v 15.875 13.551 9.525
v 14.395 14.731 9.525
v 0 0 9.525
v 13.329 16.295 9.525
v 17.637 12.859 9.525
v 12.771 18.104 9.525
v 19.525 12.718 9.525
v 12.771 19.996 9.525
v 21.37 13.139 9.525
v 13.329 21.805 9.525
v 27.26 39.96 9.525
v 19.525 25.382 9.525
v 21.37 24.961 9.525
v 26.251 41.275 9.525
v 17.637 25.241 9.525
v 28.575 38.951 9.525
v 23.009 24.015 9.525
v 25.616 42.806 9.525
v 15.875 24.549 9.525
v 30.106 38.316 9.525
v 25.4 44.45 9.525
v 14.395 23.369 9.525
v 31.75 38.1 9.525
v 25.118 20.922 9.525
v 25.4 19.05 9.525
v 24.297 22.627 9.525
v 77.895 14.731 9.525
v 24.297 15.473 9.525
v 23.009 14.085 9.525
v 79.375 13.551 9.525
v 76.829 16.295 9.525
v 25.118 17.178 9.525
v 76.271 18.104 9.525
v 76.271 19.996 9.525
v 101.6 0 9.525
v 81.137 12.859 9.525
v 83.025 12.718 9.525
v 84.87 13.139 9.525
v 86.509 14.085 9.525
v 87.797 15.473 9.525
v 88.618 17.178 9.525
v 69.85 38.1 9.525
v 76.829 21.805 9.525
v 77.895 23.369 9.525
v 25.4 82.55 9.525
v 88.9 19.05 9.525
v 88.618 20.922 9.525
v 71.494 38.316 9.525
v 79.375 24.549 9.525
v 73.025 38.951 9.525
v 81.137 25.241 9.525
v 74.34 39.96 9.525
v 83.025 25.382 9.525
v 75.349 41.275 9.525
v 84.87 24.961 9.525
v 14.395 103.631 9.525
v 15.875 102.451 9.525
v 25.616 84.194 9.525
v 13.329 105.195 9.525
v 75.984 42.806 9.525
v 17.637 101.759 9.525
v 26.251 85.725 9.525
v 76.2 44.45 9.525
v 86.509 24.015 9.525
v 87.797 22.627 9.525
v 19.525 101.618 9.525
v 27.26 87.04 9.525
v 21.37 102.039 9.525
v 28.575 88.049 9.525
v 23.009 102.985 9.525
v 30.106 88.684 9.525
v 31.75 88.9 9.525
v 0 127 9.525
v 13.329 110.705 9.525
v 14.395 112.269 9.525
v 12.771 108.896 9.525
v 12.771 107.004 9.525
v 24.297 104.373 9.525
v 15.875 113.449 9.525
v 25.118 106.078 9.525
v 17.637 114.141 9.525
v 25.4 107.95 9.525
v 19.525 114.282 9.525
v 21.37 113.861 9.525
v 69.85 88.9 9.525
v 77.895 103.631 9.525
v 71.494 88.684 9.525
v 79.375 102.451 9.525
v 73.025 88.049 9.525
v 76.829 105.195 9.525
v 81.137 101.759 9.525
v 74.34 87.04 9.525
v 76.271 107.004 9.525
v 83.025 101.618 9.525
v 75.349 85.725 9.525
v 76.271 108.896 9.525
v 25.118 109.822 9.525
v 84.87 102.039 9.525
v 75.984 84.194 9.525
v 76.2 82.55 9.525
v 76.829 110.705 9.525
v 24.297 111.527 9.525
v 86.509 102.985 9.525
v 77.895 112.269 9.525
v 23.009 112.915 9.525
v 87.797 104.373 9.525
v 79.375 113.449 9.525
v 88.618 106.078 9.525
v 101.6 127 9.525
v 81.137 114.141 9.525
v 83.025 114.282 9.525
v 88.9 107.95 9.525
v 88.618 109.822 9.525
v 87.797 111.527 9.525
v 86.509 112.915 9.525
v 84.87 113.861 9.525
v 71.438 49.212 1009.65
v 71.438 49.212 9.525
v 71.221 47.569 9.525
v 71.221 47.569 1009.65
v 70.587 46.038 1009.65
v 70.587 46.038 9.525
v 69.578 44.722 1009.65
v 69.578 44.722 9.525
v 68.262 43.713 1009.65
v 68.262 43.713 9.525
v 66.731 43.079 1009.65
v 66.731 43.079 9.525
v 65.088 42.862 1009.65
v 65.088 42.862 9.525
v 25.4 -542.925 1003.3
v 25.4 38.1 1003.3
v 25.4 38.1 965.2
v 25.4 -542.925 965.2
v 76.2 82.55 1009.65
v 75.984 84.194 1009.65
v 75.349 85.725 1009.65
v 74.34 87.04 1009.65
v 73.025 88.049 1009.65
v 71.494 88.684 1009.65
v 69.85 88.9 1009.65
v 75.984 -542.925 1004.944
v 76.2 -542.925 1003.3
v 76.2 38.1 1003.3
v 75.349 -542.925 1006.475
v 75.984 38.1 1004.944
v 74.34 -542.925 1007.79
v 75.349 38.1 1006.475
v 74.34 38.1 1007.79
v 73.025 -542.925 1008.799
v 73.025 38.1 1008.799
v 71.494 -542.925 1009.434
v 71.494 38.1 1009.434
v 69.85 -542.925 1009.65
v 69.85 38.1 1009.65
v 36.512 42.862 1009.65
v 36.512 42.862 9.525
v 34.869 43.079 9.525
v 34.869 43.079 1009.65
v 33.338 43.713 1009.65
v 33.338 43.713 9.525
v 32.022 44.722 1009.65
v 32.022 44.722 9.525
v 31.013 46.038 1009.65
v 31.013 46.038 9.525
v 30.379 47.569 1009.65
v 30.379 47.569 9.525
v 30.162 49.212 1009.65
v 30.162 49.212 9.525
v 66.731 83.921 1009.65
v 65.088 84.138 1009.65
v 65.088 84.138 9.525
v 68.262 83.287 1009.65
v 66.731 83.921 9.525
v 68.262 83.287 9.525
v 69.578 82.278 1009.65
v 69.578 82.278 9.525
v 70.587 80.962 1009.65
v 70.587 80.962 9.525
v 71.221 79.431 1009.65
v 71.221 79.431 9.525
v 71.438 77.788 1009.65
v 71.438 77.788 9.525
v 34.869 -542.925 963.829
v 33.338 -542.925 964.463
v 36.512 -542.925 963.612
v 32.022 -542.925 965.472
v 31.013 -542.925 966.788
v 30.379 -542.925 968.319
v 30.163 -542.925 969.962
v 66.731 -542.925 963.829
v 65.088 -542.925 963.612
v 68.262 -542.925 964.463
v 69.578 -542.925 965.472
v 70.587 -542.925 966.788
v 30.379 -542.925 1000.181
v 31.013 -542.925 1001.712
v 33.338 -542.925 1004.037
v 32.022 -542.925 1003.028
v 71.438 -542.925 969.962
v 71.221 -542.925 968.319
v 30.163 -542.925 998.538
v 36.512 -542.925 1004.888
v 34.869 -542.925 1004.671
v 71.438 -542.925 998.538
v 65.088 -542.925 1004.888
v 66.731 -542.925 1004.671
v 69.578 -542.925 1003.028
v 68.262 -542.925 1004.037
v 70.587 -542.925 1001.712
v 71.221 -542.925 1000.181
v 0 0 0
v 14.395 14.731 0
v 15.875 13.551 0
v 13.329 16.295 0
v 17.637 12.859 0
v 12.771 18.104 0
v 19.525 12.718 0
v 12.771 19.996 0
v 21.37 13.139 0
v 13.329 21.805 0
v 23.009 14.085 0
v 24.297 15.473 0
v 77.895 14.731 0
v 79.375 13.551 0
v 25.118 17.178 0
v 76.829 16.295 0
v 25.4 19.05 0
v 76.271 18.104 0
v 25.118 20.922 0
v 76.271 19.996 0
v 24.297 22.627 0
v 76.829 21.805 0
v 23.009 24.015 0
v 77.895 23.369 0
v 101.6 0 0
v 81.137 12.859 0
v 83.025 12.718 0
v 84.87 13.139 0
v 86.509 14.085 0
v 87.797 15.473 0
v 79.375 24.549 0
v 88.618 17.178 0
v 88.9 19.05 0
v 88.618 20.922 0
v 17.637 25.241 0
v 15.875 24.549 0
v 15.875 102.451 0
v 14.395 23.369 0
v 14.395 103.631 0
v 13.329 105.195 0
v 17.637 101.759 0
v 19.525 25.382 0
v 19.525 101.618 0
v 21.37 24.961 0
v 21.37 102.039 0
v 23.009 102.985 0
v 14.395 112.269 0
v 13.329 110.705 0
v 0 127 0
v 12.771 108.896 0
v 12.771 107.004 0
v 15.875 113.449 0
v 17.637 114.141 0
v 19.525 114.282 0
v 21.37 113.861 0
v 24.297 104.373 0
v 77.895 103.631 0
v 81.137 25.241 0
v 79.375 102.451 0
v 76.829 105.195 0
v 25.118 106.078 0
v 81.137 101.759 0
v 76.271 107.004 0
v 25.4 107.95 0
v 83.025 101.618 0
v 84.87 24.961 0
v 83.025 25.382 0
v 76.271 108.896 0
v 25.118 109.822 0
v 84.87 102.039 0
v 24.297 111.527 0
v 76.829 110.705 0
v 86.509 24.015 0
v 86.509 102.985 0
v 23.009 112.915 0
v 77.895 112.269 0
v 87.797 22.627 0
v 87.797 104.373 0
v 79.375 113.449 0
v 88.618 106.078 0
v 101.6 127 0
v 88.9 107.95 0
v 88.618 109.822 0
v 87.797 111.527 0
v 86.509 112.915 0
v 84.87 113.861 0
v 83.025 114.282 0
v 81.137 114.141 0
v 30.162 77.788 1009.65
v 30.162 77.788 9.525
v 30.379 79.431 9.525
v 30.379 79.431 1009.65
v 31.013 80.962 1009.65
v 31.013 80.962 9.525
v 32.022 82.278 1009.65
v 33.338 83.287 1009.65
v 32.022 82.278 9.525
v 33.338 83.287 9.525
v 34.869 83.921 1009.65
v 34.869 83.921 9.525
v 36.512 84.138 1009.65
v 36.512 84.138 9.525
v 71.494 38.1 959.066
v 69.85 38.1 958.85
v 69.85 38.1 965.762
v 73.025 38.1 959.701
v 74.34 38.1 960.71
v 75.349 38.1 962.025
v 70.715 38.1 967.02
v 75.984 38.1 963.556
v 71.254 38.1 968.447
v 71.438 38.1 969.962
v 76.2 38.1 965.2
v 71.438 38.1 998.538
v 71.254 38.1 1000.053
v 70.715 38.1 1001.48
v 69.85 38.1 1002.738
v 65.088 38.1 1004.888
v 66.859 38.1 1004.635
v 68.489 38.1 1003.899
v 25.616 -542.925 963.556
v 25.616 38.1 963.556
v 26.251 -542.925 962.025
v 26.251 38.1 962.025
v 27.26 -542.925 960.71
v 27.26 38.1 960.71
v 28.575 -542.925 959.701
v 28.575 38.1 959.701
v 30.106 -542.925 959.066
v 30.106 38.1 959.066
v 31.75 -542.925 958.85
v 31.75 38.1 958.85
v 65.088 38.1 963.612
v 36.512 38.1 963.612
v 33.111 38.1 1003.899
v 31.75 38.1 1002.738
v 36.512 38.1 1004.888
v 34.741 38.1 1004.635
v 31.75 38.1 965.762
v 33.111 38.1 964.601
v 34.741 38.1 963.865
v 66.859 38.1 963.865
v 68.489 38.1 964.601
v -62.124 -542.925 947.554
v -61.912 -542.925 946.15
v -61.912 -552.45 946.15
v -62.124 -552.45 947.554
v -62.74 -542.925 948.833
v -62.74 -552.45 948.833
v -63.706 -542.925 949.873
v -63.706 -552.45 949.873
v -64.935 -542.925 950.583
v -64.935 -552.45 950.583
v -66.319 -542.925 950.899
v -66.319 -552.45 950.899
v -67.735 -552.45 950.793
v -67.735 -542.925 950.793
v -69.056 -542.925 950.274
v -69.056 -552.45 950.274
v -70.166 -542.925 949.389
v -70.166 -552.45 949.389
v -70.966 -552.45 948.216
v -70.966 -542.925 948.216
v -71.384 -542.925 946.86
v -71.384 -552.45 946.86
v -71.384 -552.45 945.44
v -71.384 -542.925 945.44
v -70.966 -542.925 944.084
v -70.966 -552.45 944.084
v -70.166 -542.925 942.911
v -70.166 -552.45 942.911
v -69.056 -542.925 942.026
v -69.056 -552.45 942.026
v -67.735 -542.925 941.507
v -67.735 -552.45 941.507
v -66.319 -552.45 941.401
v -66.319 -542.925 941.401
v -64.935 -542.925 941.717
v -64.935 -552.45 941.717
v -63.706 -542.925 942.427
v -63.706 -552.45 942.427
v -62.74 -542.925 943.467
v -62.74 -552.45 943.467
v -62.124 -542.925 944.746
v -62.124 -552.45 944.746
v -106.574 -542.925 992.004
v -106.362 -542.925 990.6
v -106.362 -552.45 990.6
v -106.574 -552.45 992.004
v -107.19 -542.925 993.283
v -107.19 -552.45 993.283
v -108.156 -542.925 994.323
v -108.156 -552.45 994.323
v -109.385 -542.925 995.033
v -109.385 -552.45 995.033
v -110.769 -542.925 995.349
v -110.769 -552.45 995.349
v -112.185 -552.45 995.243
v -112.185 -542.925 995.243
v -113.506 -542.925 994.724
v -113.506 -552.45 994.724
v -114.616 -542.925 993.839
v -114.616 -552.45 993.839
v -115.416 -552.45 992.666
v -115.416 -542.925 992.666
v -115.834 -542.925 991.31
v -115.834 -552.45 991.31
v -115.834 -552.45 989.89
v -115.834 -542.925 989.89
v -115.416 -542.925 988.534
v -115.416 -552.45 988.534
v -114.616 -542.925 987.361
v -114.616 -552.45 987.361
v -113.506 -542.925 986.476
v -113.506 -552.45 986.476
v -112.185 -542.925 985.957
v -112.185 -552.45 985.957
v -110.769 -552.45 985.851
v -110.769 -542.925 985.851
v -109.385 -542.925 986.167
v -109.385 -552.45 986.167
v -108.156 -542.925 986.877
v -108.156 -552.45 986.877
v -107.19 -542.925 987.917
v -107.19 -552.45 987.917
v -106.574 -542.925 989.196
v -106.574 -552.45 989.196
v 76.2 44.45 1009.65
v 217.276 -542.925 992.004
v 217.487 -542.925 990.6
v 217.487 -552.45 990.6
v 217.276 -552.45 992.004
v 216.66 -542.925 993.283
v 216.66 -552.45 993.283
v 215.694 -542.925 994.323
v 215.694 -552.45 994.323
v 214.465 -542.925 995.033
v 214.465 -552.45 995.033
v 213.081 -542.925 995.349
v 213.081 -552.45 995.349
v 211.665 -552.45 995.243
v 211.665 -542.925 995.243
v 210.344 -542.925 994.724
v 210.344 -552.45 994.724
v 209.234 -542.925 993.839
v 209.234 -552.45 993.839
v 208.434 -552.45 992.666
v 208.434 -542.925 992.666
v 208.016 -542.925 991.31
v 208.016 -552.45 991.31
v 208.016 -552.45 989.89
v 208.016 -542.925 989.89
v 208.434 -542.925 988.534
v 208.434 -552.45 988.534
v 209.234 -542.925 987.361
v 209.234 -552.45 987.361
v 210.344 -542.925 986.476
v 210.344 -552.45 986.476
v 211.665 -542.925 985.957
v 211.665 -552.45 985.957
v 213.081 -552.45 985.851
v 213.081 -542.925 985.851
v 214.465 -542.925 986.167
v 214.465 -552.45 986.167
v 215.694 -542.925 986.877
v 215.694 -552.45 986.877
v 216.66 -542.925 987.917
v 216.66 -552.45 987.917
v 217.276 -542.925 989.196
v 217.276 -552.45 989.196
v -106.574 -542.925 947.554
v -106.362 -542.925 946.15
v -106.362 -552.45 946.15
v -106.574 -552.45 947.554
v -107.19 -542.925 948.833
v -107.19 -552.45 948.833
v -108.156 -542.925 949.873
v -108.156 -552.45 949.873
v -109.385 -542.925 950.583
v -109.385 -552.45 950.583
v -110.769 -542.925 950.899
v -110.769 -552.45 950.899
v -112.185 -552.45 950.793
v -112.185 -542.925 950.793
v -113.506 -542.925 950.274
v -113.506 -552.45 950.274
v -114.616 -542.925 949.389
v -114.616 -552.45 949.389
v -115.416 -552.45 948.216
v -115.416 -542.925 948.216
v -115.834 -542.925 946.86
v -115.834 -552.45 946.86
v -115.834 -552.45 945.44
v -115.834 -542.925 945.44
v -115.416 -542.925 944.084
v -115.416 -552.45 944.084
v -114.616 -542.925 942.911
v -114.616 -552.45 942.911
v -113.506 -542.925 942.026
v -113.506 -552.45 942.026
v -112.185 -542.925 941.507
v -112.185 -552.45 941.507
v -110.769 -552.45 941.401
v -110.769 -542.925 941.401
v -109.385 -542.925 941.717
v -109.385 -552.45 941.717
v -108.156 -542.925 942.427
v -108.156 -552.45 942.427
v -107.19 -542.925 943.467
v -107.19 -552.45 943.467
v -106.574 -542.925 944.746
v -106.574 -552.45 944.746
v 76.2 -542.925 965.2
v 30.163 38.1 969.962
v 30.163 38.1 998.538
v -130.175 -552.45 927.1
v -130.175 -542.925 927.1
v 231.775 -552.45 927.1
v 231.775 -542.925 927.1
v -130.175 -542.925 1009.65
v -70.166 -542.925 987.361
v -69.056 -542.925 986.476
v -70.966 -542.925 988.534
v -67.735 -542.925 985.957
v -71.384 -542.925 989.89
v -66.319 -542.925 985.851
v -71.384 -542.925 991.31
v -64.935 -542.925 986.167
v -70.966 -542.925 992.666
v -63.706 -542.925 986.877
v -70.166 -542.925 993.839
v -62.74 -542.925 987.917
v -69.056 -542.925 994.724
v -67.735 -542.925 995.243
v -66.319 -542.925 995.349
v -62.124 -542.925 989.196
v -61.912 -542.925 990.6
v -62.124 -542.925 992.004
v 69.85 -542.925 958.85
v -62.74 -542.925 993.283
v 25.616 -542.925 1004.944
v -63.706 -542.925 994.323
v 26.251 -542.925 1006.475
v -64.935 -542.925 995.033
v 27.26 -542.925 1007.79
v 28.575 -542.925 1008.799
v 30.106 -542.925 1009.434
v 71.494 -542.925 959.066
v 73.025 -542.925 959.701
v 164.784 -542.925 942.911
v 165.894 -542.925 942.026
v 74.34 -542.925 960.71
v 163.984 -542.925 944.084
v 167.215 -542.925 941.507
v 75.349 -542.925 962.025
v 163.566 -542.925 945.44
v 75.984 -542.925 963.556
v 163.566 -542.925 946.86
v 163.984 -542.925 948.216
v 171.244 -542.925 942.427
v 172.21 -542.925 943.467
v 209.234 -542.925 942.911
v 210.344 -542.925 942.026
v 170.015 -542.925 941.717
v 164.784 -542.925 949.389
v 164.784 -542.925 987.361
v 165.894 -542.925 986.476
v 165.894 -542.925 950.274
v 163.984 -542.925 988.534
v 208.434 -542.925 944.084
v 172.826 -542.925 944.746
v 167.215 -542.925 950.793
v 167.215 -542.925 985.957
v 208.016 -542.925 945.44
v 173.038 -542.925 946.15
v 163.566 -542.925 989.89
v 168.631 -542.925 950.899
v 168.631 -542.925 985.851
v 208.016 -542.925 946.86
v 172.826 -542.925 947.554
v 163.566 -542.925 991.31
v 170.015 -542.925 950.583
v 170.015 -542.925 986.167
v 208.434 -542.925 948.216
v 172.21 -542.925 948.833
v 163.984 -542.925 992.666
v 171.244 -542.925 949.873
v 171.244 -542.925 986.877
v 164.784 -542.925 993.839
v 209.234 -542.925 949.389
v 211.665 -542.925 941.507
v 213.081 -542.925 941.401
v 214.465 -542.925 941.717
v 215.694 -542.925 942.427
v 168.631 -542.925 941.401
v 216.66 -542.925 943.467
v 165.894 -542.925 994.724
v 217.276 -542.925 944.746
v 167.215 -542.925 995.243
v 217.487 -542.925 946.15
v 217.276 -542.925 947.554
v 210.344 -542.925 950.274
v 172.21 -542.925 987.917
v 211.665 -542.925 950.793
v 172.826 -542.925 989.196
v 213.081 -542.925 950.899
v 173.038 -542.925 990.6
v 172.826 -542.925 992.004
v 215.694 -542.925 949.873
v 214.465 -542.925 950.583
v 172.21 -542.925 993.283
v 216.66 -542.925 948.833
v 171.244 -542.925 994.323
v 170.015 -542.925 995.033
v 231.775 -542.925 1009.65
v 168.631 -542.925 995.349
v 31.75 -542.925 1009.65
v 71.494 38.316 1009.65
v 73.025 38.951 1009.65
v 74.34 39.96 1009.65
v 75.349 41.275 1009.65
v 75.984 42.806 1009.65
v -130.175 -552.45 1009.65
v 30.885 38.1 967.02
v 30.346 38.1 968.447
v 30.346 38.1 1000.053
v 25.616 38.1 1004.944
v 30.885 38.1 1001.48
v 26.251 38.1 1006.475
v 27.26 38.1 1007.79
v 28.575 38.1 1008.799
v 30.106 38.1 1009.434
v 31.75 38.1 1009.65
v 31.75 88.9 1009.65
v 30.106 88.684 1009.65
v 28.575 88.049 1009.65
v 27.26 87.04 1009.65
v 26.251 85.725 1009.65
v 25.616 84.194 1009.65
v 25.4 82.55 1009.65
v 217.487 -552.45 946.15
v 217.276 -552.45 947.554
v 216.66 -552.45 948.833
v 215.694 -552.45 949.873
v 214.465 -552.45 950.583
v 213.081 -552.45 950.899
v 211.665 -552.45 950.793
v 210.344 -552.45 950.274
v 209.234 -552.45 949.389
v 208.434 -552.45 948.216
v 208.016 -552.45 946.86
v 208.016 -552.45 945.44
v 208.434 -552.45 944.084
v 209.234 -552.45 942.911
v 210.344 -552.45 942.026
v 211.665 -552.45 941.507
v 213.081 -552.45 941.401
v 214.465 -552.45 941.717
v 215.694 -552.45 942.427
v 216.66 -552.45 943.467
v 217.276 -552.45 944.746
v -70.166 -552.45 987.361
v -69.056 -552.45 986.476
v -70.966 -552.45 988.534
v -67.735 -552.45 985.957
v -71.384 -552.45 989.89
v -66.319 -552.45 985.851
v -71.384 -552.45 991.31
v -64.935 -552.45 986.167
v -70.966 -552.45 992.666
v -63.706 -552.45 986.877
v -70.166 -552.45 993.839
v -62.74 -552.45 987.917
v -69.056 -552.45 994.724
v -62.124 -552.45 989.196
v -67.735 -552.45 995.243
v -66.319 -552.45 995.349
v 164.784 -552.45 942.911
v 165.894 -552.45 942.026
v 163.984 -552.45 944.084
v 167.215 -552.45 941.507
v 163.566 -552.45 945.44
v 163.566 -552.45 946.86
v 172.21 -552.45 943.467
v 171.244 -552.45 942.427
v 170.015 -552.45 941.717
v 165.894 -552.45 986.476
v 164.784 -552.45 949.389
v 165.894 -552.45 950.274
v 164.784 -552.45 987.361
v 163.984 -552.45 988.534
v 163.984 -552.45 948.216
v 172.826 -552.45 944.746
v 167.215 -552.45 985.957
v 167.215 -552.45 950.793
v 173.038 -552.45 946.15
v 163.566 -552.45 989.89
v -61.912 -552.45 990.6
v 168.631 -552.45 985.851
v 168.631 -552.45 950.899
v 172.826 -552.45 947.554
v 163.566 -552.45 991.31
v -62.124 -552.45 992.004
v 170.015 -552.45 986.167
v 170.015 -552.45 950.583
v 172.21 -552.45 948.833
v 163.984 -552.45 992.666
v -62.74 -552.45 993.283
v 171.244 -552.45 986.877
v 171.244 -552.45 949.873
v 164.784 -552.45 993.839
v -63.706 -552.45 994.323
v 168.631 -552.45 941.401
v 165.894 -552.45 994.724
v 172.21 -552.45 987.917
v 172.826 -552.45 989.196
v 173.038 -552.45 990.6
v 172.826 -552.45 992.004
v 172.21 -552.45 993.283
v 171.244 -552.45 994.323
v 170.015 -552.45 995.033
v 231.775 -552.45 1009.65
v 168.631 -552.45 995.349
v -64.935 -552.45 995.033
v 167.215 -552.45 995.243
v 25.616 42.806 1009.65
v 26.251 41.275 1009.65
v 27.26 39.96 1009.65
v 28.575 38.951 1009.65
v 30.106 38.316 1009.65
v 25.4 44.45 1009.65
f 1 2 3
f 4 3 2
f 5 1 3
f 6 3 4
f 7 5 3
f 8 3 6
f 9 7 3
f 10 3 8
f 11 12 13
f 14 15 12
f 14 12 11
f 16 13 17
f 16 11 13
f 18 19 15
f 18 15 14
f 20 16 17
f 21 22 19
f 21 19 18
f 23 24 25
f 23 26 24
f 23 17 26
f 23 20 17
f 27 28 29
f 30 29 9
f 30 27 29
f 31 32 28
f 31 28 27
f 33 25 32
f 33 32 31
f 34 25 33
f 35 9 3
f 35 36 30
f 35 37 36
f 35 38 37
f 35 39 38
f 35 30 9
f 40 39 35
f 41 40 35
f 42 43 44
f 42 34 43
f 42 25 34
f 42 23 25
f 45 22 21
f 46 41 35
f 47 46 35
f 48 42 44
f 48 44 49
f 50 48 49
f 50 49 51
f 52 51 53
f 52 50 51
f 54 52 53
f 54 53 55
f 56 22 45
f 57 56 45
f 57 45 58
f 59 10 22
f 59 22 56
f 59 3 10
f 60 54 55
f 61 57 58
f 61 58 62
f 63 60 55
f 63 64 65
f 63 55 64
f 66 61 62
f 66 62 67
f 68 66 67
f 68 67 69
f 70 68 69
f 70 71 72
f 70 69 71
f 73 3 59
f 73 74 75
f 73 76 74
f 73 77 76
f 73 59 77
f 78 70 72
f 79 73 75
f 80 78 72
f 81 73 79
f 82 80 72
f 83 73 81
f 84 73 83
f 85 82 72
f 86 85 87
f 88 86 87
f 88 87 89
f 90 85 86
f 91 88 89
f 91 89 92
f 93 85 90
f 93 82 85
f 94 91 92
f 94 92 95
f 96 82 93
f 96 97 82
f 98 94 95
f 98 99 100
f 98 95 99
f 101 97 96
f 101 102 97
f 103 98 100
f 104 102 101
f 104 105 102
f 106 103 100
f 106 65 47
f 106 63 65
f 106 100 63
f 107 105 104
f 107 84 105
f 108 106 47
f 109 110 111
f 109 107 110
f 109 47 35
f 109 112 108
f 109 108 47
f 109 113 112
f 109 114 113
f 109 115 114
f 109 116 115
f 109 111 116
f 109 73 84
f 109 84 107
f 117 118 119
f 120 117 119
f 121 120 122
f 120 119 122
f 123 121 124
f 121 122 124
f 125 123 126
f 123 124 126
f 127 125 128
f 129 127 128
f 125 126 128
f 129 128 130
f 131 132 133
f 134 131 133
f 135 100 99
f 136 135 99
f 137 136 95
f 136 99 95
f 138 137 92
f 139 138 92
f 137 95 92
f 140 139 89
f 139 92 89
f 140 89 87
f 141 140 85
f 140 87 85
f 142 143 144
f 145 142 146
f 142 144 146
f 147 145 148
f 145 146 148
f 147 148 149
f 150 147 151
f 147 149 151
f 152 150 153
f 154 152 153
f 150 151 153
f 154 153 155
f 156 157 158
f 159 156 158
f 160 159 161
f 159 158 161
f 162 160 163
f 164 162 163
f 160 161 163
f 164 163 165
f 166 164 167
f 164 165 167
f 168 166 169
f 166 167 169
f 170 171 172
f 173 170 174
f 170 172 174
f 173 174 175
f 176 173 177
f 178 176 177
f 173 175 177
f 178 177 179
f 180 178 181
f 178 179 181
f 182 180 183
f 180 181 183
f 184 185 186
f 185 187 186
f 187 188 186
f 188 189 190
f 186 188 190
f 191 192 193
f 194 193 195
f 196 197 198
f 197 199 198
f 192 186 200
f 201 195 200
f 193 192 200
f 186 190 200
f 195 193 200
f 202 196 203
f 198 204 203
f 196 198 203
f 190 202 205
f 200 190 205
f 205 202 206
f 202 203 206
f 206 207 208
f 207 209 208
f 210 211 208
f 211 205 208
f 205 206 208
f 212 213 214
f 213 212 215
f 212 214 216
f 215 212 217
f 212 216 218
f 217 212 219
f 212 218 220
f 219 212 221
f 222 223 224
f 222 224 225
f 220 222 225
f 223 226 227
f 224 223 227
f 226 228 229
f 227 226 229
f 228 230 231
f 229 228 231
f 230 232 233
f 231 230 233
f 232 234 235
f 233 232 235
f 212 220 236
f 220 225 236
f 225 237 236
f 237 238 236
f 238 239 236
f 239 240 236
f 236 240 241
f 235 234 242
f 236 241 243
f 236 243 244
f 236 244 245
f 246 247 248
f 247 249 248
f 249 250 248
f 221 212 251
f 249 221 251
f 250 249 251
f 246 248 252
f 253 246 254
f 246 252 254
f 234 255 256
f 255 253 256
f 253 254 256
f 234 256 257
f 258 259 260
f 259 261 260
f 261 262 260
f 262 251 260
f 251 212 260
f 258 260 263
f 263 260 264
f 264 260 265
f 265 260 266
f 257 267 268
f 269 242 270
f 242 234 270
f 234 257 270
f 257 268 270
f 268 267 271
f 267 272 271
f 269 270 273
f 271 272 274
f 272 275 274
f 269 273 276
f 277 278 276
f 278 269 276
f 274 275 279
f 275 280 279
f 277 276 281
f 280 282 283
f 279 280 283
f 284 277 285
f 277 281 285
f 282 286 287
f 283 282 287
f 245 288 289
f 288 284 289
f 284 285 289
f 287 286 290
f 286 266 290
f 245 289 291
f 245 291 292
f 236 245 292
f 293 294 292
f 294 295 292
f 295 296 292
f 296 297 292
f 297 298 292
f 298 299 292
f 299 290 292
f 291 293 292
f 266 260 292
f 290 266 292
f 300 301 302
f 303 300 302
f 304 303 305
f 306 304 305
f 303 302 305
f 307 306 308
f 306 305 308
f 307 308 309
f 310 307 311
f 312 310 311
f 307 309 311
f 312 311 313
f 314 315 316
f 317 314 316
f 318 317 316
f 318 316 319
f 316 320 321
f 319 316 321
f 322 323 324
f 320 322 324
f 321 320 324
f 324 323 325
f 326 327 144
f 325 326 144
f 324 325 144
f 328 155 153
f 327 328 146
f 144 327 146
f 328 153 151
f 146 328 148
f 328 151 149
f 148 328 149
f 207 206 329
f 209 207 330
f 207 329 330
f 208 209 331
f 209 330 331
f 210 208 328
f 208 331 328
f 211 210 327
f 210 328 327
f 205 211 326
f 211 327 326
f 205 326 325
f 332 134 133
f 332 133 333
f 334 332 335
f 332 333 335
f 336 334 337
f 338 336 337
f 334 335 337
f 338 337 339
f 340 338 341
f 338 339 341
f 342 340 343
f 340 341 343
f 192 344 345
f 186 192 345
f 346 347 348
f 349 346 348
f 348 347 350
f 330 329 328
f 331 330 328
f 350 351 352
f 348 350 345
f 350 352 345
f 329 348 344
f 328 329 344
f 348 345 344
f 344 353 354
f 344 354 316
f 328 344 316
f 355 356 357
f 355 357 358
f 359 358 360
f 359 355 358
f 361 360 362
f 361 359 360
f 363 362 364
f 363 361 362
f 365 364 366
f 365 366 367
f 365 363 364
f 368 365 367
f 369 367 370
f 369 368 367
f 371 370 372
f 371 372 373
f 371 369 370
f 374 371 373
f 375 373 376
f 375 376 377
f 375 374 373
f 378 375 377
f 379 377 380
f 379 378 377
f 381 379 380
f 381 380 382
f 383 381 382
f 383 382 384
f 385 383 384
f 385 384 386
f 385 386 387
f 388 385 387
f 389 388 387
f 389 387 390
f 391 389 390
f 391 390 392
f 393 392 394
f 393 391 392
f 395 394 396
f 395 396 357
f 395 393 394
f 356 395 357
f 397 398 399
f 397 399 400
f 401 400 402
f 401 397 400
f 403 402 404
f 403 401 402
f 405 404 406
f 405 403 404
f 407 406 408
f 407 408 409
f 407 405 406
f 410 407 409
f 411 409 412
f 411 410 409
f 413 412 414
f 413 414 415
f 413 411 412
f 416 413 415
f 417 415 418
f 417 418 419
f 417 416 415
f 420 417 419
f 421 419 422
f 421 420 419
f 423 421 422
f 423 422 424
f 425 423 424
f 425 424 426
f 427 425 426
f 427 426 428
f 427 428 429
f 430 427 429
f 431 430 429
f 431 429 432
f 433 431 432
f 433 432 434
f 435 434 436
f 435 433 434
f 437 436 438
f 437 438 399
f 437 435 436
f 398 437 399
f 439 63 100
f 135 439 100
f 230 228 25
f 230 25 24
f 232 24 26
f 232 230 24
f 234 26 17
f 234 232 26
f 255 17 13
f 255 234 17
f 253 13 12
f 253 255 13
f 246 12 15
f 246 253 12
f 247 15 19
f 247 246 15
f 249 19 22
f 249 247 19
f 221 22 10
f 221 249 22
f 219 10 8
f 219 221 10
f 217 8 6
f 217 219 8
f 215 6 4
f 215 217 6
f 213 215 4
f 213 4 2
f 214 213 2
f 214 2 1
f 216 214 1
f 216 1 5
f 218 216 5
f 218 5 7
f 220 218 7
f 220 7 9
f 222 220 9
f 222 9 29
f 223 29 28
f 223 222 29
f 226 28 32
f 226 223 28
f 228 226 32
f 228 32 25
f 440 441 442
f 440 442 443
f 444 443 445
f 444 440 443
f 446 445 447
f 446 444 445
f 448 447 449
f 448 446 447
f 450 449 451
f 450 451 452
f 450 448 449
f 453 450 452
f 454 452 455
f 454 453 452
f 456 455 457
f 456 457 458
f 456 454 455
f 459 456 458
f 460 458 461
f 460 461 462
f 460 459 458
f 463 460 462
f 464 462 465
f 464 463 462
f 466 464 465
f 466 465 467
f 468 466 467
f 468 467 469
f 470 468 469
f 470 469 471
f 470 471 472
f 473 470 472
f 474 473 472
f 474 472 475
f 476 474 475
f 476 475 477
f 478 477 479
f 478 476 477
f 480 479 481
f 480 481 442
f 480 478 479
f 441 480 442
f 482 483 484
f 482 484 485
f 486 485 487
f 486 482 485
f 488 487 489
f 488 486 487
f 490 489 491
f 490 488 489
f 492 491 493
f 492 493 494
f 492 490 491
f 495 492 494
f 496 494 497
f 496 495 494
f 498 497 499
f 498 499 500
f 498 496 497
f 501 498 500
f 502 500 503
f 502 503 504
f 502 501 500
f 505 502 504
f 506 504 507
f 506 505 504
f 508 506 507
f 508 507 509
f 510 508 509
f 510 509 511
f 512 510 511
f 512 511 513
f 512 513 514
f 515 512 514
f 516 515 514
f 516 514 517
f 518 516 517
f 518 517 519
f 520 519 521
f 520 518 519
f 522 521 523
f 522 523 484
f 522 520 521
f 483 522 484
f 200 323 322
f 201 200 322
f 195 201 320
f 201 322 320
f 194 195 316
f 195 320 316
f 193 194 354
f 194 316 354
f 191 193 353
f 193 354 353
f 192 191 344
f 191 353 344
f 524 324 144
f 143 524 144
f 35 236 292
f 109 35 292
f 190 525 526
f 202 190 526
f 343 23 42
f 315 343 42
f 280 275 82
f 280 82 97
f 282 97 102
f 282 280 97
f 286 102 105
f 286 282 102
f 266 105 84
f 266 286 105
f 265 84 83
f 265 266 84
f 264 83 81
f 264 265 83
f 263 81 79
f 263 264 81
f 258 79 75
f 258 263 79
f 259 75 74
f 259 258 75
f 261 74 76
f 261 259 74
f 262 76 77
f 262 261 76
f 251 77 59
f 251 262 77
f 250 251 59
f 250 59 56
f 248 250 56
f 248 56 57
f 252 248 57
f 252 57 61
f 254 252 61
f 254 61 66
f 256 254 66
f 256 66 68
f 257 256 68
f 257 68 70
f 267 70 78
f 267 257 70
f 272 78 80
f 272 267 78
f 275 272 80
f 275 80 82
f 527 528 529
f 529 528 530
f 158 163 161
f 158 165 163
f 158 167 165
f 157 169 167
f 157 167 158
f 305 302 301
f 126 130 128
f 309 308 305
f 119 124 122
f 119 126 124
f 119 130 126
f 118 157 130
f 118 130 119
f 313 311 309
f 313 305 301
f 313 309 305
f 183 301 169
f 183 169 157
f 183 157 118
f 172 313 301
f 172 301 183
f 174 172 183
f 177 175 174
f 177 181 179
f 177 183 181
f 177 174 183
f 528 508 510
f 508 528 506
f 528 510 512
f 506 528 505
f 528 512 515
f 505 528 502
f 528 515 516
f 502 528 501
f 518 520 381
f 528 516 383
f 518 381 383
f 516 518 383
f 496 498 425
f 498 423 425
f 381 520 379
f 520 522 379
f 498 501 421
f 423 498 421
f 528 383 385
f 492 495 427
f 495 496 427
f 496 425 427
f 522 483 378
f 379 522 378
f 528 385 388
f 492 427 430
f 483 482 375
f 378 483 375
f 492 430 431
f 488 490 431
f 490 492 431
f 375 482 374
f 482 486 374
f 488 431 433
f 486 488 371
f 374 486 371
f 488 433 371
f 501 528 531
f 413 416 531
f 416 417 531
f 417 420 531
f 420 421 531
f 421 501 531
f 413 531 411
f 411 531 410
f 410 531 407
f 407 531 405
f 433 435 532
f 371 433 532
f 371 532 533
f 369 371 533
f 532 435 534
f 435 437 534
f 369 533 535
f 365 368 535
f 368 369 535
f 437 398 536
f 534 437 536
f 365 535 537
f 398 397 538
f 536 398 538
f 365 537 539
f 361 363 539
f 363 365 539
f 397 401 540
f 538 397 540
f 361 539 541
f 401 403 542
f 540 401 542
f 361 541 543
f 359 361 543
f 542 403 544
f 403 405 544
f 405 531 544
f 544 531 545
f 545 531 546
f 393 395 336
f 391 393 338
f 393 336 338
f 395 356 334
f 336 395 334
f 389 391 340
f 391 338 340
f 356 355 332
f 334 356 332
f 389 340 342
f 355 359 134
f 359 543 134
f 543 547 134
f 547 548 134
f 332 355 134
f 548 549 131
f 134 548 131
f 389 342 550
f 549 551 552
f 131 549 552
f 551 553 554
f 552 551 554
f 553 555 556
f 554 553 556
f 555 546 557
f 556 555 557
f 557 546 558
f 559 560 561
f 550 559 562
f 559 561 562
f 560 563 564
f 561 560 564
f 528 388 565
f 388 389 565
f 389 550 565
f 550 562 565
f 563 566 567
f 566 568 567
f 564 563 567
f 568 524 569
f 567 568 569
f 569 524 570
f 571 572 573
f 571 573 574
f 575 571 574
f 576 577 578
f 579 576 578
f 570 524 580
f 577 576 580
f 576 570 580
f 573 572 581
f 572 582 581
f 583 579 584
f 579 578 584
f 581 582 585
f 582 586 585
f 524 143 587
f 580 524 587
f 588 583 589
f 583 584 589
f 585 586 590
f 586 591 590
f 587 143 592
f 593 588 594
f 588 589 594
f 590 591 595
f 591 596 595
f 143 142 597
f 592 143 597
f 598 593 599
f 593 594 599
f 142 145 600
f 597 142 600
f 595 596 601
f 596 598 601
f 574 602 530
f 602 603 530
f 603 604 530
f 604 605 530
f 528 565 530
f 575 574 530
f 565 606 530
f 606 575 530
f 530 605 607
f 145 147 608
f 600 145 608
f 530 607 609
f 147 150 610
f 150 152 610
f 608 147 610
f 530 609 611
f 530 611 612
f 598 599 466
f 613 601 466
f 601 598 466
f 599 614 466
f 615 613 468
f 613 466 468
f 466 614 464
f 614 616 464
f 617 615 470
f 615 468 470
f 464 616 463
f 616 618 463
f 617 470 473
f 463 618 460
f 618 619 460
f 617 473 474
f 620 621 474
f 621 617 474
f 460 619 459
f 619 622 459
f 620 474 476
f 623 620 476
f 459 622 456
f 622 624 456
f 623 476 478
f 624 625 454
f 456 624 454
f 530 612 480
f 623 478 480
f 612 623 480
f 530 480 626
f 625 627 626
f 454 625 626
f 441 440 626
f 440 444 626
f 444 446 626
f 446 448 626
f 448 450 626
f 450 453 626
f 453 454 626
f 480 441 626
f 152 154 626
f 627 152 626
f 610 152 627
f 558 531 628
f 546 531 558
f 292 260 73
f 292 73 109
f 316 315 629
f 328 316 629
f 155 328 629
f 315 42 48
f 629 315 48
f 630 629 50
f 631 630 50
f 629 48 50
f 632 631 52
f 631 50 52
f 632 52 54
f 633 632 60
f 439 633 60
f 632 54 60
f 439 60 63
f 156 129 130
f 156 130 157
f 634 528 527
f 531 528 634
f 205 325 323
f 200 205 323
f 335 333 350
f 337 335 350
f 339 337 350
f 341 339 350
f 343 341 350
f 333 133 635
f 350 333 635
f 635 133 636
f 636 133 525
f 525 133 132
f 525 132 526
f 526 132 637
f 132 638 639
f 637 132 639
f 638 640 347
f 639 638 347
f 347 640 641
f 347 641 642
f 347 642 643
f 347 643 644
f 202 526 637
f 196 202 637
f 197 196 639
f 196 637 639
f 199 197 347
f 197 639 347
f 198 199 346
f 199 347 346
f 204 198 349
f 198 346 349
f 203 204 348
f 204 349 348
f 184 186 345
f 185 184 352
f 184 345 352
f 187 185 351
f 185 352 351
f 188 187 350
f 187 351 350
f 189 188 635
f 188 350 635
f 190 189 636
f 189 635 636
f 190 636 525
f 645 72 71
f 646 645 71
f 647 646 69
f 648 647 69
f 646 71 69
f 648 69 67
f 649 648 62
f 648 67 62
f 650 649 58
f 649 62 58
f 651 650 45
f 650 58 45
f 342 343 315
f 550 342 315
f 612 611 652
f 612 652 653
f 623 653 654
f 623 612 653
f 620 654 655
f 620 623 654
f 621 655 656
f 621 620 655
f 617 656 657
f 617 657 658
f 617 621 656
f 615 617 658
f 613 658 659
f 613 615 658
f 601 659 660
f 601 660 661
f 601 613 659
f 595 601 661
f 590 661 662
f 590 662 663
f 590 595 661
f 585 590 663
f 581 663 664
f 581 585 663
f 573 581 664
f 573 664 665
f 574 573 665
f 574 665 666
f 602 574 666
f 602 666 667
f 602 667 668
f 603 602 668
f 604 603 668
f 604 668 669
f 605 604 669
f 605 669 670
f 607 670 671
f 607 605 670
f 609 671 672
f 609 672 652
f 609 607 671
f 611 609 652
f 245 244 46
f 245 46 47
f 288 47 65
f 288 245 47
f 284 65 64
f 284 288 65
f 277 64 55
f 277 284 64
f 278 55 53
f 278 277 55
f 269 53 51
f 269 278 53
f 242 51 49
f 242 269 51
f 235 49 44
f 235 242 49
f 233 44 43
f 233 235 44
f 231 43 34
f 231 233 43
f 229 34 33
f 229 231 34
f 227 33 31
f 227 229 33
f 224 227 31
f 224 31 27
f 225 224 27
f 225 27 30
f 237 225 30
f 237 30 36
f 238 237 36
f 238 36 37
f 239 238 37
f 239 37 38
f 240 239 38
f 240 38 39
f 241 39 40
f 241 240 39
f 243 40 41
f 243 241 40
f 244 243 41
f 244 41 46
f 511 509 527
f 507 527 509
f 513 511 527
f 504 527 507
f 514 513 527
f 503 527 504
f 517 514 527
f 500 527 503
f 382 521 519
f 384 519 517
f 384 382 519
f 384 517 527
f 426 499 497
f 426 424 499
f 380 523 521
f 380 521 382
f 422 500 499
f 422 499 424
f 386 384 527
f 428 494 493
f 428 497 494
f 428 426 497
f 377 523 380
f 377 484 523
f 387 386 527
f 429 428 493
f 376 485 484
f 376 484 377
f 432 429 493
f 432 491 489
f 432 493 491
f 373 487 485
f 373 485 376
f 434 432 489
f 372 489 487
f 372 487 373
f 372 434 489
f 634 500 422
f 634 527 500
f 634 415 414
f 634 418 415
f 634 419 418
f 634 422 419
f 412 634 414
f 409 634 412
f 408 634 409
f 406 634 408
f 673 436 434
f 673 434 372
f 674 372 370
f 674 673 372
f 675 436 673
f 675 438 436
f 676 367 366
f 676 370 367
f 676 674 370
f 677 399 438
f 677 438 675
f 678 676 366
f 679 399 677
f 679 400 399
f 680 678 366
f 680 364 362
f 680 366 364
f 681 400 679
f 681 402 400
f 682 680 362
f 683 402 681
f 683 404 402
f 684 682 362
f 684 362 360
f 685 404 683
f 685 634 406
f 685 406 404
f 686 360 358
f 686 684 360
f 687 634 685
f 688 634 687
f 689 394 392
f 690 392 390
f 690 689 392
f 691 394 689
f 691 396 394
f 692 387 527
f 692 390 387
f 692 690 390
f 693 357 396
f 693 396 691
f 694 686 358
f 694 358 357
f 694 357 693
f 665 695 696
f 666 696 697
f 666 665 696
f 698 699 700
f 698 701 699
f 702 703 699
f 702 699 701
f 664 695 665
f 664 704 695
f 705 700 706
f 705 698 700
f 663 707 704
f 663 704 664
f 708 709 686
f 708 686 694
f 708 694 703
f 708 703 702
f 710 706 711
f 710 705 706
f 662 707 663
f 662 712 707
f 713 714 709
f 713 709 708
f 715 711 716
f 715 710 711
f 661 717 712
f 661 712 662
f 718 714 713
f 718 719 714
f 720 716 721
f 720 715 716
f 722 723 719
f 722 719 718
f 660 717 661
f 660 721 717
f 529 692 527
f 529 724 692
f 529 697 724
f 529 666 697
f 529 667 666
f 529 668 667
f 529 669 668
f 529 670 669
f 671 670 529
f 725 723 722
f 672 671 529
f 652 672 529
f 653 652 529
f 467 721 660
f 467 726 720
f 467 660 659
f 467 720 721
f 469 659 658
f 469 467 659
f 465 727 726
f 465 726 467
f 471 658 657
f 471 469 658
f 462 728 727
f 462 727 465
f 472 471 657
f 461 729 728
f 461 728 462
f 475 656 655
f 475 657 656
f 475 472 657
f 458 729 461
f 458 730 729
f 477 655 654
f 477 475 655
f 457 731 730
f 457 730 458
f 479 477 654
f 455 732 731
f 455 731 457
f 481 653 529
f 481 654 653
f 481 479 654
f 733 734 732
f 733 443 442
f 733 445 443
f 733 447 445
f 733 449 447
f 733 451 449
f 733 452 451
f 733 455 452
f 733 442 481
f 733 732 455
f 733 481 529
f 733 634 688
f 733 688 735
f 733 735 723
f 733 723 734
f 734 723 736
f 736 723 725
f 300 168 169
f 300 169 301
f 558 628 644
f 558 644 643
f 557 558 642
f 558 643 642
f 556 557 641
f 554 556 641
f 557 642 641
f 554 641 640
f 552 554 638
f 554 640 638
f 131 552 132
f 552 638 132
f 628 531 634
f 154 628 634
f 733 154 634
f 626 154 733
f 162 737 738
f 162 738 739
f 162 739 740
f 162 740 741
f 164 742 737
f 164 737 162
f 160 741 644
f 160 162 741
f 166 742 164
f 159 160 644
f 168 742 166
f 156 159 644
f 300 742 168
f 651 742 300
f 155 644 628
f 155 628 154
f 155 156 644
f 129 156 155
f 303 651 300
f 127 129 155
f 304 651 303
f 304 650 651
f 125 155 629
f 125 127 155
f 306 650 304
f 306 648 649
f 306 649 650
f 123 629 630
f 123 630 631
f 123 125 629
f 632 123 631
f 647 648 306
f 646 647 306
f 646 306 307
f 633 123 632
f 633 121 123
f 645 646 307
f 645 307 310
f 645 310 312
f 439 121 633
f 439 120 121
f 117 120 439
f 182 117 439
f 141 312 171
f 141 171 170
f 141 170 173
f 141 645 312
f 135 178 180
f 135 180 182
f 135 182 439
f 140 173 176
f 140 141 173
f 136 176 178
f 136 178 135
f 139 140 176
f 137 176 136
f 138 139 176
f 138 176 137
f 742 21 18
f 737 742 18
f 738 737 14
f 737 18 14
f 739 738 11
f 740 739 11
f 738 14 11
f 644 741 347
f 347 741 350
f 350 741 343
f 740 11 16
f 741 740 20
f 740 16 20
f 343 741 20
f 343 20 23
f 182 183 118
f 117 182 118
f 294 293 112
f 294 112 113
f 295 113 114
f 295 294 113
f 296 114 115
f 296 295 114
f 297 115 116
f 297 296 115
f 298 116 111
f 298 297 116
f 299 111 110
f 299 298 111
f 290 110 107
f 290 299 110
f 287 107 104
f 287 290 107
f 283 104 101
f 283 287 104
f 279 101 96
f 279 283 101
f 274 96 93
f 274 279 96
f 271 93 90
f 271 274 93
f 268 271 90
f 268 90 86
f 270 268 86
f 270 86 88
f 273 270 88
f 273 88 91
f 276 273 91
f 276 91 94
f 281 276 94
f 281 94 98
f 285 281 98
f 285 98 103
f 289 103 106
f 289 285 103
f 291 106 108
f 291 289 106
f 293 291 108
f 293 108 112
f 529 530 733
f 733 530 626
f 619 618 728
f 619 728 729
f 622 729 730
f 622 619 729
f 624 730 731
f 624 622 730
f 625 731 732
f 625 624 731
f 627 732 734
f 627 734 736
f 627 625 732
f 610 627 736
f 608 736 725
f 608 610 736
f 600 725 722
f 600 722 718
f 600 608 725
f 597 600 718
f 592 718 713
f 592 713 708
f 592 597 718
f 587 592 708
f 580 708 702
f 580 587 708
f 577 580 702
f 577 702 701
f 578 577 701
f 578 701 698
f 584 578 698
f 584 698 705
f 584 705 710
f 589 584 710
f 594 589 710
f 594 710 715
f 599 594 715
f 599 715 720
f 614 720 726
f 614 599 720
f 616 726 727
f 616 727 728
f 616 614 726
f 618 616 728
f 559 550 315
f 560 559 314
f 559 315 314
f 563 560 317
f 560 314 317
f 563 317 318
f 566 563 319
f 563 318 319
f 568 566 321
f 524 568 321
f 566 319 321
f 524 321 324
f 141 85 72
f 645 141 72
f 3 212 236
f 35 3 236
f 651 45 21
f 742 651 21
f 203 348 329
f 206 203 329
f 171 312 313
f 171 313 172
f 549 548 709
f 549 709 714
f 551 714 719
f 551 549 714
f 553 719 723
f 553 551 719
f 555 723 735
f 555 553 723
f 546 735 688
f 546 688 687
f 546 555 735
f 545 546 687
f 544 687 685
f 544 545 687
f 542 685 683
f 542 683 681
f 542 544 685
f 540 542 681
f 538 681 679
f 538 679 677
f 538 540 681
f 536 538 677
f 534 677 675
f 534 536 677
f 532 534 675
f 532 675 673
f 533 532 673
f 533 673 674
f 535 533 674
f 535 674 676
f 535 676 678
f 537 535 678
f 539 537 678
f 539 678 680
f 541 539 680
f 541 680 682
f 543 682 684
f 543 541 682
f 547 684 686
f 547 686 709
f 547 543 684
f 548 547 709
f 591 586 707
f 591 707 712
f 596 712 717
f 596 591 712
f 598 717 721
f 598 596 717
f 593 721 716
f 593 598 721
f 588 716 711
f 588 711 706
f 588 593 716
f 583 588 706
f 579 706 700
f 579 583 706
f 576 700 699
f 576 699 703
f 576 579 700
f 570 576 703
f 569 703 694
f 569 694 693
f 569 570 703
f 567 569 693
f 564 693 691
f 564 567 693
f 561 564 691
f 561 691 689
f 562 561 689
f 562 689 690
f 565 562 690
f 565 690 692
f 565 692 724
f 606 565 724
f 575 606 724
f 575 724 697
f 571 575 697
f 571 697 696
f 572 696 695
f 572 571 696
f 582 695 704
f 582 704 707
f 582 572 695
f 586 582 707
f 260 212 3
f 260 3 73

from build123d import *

# Parameters (mm, degrees)
F0_W     = 101.6
F0_H     = 127
F0_R     = 6.35
F1_DEPTH = 9.525
F4_DEPTH = 1000.125
F6_DEPTH = 581.025
F7_W     = 361.95
F7_H     = 82.55
F7_R     = 4.7625
F8_DEPTH = 9.525


# Not quite as in the source:
# - a length typed as a fraction of an inch, garbled in the dataset ("3 / 203.2 mm" for 3/8 in), is restored


with BuildPart() as f1:
    # F0 (on Top) → F1 (new body)
    with BuildSketch(Plane.XY):
        with Locations((50.8, 63.5)):
            Rectangle(F0_W, F0_H)
        with Locations((19.05, 19.05)):
            Circle(F0_R, mode=Mode.SUBTRACT)
        with Locations((82.55, 19.05)):
            Circle(F0_R, mode=Mode.SUBTRACT)
        with Locations((19.05, 107.95)):
            Circle(F0_R, mode=Mode.SUBTRACT)
        with Locations((82.55, 107.95)):
            Circle(F0_R, mode=Mode.SUBTRACT)
    extrude(amount=F1_DEPTH)

    # F3 (on offset) → F4 (join)
    with BuildSketch(Plane.XY.offset(9.525)):
        with BuildLine():
            Line((31.75, 38.1), (69.85, 38.1))
            ThreePointArc((69.85, 38.1), (74.3401280605, 39.9598719395), (76.2, 44.45))
            Line((76.2, 44.45), (76.2, 82.55))
            ThreePointArc((76.2, 82.55), (74.3401280605, 87.0401280605), (69.85, 88.9))
            Line((69.85, 88.9), (31.75, 88.9))
            ThreePointArc((31.75, 88.9), (27.2598719395, 87.0401280605), (25.4, 82.55))
            Line((25.4, 82.55), (25.4, 44.45))
            ThreePointArc((25.4, 44.45), (27.2598719395, 39.9598719395), (31.75, 38.1))
        make_face()
        with BuildLine():
            ThreePointArc((71.4375, 49.2125), (69.5776280605, 44.7223719395), (65.0875, 42.8625))
            Line((65.0875, 42.8625), (36.5125, 42.8625))
            ThreePointArc((36.5125, 42.8625), (32.0223719395, 44.7223719395), (30.1625, 49.2125))
            Line((30.1625, 49.2125), (30.1625, 77.7875))
            ThreePointArc((30.1625, 77.7875), (32.0223719395, 82.2776280605), (36.5125, 84.1375))
            Line((36.5125, 84.1375), (65.0875, 84.1375))
            ThreePointArc((65.0875, 84.1375), (69.5776280605, 82.2776280605), (71.4375, 77.7875))
            Line((71.4375, 77.7875), (71.4375, 49.2125))
        make_face(mode=Mode.SUBTRACT)
    extrude(amount=F4_DEPTH)

    # F5 (on face) → F6 (join)
    with BuildSketch(Plane.XZ.offset(-38.1)):
        with BuildLine():
            Line((31.75, 958.85), (69.85, 958.85))
            ThreePointArc((69.85, 958.85), (74.3401280605, 960.7098719395), (76.2, 965.2))
            Line((76.2, 965.2), (76.2, 1003.3))
            ThreePointArc((76.2, 1003.3), (74.3401280605, 1007.7901280605), (69.85, 1009.65))
            Line((69.85, 1009.65), (31.75, 1009.65))
            ThreePointArc((31.75, 1009.65), (27.2598719395, 1007.7901280605), (25.4, 1003.3))
            Line((25.4, 1003.3), (25.4, 965.2))
            ThreePointArc((25.4, 965.2), (27.2598719395, 960.7098719395), (31.75, 958.85))
        make_face()
        with BuildLine():
            ThreePointArc((71.4375, 969.9625), (69.5776280605, 965.4723719395), (65.0875, 963.6125))
            Line((65.0875, 963.6125), (36.5125, 963.6125))
            ThreePointArc((36.5125, 963.6125), (32.0223719395, 965.4723719395), (30.1625, 969.9625))
            Line((30.1625, 969.9625), (30.1625, 998.5375))
            ThreePointArc((30.1625, 998.5375), (32.0223719395, 1003.0276280605), (36.5125, 1004.8875))
            Line((36.5125, 1004.8875), (65.0875, 1004.8875))
            ThreePointArc((65.0875, 1004.8875), (69.5776280605, 1003.0276280605), (71.4375, 998.5375))
            Line((71.4375, 998.5375), (71.4375, 969.9625))
        make_face(mode=Mode.SUBTRACT)
    extrude(amount=F6_DEPTH)

    # F7 (on face) → F8 (join)
    with BuildSketch(Plane.XZ.offset(542.925)):
        with Locations((50.8, 968.375)):
            Rectangle(F7_W, F7_H)
        with Locations((-111.125, 946.15)):
            Circle(F7_R, mode=Mode.SUBTRACT)
        with Locations((-66.675, 946.15)):
            Circle(F7_R, mode=Mode.SUBTRACT)
        with Locations((168.275, 946.15)):
            Circle(F7_R, mode=Mode.SUBTRACT)
        with Locations((212.725, 946.15)):
            Circle(F7_R, mode=Mode.SUBTRACT)
        with Locations((-111.125, 990.6)):
            Circle(F7_R, mode=Mode.SUBTRACT)
        with Locations((-66.675, 990.6)):
            Circle(F7_R, mode=Mode.SUBTRACT)
        with Locations((168.275, 990.6)):
            Circle(F7_R, mode=Mode.SUBTRACT)
        with Locations((212.725, 990.6)):
            Circle(F7_R, mode=Mode.SUBTRACT)
    extrude(amount=F8_DEPTH)


solid = f1.part
